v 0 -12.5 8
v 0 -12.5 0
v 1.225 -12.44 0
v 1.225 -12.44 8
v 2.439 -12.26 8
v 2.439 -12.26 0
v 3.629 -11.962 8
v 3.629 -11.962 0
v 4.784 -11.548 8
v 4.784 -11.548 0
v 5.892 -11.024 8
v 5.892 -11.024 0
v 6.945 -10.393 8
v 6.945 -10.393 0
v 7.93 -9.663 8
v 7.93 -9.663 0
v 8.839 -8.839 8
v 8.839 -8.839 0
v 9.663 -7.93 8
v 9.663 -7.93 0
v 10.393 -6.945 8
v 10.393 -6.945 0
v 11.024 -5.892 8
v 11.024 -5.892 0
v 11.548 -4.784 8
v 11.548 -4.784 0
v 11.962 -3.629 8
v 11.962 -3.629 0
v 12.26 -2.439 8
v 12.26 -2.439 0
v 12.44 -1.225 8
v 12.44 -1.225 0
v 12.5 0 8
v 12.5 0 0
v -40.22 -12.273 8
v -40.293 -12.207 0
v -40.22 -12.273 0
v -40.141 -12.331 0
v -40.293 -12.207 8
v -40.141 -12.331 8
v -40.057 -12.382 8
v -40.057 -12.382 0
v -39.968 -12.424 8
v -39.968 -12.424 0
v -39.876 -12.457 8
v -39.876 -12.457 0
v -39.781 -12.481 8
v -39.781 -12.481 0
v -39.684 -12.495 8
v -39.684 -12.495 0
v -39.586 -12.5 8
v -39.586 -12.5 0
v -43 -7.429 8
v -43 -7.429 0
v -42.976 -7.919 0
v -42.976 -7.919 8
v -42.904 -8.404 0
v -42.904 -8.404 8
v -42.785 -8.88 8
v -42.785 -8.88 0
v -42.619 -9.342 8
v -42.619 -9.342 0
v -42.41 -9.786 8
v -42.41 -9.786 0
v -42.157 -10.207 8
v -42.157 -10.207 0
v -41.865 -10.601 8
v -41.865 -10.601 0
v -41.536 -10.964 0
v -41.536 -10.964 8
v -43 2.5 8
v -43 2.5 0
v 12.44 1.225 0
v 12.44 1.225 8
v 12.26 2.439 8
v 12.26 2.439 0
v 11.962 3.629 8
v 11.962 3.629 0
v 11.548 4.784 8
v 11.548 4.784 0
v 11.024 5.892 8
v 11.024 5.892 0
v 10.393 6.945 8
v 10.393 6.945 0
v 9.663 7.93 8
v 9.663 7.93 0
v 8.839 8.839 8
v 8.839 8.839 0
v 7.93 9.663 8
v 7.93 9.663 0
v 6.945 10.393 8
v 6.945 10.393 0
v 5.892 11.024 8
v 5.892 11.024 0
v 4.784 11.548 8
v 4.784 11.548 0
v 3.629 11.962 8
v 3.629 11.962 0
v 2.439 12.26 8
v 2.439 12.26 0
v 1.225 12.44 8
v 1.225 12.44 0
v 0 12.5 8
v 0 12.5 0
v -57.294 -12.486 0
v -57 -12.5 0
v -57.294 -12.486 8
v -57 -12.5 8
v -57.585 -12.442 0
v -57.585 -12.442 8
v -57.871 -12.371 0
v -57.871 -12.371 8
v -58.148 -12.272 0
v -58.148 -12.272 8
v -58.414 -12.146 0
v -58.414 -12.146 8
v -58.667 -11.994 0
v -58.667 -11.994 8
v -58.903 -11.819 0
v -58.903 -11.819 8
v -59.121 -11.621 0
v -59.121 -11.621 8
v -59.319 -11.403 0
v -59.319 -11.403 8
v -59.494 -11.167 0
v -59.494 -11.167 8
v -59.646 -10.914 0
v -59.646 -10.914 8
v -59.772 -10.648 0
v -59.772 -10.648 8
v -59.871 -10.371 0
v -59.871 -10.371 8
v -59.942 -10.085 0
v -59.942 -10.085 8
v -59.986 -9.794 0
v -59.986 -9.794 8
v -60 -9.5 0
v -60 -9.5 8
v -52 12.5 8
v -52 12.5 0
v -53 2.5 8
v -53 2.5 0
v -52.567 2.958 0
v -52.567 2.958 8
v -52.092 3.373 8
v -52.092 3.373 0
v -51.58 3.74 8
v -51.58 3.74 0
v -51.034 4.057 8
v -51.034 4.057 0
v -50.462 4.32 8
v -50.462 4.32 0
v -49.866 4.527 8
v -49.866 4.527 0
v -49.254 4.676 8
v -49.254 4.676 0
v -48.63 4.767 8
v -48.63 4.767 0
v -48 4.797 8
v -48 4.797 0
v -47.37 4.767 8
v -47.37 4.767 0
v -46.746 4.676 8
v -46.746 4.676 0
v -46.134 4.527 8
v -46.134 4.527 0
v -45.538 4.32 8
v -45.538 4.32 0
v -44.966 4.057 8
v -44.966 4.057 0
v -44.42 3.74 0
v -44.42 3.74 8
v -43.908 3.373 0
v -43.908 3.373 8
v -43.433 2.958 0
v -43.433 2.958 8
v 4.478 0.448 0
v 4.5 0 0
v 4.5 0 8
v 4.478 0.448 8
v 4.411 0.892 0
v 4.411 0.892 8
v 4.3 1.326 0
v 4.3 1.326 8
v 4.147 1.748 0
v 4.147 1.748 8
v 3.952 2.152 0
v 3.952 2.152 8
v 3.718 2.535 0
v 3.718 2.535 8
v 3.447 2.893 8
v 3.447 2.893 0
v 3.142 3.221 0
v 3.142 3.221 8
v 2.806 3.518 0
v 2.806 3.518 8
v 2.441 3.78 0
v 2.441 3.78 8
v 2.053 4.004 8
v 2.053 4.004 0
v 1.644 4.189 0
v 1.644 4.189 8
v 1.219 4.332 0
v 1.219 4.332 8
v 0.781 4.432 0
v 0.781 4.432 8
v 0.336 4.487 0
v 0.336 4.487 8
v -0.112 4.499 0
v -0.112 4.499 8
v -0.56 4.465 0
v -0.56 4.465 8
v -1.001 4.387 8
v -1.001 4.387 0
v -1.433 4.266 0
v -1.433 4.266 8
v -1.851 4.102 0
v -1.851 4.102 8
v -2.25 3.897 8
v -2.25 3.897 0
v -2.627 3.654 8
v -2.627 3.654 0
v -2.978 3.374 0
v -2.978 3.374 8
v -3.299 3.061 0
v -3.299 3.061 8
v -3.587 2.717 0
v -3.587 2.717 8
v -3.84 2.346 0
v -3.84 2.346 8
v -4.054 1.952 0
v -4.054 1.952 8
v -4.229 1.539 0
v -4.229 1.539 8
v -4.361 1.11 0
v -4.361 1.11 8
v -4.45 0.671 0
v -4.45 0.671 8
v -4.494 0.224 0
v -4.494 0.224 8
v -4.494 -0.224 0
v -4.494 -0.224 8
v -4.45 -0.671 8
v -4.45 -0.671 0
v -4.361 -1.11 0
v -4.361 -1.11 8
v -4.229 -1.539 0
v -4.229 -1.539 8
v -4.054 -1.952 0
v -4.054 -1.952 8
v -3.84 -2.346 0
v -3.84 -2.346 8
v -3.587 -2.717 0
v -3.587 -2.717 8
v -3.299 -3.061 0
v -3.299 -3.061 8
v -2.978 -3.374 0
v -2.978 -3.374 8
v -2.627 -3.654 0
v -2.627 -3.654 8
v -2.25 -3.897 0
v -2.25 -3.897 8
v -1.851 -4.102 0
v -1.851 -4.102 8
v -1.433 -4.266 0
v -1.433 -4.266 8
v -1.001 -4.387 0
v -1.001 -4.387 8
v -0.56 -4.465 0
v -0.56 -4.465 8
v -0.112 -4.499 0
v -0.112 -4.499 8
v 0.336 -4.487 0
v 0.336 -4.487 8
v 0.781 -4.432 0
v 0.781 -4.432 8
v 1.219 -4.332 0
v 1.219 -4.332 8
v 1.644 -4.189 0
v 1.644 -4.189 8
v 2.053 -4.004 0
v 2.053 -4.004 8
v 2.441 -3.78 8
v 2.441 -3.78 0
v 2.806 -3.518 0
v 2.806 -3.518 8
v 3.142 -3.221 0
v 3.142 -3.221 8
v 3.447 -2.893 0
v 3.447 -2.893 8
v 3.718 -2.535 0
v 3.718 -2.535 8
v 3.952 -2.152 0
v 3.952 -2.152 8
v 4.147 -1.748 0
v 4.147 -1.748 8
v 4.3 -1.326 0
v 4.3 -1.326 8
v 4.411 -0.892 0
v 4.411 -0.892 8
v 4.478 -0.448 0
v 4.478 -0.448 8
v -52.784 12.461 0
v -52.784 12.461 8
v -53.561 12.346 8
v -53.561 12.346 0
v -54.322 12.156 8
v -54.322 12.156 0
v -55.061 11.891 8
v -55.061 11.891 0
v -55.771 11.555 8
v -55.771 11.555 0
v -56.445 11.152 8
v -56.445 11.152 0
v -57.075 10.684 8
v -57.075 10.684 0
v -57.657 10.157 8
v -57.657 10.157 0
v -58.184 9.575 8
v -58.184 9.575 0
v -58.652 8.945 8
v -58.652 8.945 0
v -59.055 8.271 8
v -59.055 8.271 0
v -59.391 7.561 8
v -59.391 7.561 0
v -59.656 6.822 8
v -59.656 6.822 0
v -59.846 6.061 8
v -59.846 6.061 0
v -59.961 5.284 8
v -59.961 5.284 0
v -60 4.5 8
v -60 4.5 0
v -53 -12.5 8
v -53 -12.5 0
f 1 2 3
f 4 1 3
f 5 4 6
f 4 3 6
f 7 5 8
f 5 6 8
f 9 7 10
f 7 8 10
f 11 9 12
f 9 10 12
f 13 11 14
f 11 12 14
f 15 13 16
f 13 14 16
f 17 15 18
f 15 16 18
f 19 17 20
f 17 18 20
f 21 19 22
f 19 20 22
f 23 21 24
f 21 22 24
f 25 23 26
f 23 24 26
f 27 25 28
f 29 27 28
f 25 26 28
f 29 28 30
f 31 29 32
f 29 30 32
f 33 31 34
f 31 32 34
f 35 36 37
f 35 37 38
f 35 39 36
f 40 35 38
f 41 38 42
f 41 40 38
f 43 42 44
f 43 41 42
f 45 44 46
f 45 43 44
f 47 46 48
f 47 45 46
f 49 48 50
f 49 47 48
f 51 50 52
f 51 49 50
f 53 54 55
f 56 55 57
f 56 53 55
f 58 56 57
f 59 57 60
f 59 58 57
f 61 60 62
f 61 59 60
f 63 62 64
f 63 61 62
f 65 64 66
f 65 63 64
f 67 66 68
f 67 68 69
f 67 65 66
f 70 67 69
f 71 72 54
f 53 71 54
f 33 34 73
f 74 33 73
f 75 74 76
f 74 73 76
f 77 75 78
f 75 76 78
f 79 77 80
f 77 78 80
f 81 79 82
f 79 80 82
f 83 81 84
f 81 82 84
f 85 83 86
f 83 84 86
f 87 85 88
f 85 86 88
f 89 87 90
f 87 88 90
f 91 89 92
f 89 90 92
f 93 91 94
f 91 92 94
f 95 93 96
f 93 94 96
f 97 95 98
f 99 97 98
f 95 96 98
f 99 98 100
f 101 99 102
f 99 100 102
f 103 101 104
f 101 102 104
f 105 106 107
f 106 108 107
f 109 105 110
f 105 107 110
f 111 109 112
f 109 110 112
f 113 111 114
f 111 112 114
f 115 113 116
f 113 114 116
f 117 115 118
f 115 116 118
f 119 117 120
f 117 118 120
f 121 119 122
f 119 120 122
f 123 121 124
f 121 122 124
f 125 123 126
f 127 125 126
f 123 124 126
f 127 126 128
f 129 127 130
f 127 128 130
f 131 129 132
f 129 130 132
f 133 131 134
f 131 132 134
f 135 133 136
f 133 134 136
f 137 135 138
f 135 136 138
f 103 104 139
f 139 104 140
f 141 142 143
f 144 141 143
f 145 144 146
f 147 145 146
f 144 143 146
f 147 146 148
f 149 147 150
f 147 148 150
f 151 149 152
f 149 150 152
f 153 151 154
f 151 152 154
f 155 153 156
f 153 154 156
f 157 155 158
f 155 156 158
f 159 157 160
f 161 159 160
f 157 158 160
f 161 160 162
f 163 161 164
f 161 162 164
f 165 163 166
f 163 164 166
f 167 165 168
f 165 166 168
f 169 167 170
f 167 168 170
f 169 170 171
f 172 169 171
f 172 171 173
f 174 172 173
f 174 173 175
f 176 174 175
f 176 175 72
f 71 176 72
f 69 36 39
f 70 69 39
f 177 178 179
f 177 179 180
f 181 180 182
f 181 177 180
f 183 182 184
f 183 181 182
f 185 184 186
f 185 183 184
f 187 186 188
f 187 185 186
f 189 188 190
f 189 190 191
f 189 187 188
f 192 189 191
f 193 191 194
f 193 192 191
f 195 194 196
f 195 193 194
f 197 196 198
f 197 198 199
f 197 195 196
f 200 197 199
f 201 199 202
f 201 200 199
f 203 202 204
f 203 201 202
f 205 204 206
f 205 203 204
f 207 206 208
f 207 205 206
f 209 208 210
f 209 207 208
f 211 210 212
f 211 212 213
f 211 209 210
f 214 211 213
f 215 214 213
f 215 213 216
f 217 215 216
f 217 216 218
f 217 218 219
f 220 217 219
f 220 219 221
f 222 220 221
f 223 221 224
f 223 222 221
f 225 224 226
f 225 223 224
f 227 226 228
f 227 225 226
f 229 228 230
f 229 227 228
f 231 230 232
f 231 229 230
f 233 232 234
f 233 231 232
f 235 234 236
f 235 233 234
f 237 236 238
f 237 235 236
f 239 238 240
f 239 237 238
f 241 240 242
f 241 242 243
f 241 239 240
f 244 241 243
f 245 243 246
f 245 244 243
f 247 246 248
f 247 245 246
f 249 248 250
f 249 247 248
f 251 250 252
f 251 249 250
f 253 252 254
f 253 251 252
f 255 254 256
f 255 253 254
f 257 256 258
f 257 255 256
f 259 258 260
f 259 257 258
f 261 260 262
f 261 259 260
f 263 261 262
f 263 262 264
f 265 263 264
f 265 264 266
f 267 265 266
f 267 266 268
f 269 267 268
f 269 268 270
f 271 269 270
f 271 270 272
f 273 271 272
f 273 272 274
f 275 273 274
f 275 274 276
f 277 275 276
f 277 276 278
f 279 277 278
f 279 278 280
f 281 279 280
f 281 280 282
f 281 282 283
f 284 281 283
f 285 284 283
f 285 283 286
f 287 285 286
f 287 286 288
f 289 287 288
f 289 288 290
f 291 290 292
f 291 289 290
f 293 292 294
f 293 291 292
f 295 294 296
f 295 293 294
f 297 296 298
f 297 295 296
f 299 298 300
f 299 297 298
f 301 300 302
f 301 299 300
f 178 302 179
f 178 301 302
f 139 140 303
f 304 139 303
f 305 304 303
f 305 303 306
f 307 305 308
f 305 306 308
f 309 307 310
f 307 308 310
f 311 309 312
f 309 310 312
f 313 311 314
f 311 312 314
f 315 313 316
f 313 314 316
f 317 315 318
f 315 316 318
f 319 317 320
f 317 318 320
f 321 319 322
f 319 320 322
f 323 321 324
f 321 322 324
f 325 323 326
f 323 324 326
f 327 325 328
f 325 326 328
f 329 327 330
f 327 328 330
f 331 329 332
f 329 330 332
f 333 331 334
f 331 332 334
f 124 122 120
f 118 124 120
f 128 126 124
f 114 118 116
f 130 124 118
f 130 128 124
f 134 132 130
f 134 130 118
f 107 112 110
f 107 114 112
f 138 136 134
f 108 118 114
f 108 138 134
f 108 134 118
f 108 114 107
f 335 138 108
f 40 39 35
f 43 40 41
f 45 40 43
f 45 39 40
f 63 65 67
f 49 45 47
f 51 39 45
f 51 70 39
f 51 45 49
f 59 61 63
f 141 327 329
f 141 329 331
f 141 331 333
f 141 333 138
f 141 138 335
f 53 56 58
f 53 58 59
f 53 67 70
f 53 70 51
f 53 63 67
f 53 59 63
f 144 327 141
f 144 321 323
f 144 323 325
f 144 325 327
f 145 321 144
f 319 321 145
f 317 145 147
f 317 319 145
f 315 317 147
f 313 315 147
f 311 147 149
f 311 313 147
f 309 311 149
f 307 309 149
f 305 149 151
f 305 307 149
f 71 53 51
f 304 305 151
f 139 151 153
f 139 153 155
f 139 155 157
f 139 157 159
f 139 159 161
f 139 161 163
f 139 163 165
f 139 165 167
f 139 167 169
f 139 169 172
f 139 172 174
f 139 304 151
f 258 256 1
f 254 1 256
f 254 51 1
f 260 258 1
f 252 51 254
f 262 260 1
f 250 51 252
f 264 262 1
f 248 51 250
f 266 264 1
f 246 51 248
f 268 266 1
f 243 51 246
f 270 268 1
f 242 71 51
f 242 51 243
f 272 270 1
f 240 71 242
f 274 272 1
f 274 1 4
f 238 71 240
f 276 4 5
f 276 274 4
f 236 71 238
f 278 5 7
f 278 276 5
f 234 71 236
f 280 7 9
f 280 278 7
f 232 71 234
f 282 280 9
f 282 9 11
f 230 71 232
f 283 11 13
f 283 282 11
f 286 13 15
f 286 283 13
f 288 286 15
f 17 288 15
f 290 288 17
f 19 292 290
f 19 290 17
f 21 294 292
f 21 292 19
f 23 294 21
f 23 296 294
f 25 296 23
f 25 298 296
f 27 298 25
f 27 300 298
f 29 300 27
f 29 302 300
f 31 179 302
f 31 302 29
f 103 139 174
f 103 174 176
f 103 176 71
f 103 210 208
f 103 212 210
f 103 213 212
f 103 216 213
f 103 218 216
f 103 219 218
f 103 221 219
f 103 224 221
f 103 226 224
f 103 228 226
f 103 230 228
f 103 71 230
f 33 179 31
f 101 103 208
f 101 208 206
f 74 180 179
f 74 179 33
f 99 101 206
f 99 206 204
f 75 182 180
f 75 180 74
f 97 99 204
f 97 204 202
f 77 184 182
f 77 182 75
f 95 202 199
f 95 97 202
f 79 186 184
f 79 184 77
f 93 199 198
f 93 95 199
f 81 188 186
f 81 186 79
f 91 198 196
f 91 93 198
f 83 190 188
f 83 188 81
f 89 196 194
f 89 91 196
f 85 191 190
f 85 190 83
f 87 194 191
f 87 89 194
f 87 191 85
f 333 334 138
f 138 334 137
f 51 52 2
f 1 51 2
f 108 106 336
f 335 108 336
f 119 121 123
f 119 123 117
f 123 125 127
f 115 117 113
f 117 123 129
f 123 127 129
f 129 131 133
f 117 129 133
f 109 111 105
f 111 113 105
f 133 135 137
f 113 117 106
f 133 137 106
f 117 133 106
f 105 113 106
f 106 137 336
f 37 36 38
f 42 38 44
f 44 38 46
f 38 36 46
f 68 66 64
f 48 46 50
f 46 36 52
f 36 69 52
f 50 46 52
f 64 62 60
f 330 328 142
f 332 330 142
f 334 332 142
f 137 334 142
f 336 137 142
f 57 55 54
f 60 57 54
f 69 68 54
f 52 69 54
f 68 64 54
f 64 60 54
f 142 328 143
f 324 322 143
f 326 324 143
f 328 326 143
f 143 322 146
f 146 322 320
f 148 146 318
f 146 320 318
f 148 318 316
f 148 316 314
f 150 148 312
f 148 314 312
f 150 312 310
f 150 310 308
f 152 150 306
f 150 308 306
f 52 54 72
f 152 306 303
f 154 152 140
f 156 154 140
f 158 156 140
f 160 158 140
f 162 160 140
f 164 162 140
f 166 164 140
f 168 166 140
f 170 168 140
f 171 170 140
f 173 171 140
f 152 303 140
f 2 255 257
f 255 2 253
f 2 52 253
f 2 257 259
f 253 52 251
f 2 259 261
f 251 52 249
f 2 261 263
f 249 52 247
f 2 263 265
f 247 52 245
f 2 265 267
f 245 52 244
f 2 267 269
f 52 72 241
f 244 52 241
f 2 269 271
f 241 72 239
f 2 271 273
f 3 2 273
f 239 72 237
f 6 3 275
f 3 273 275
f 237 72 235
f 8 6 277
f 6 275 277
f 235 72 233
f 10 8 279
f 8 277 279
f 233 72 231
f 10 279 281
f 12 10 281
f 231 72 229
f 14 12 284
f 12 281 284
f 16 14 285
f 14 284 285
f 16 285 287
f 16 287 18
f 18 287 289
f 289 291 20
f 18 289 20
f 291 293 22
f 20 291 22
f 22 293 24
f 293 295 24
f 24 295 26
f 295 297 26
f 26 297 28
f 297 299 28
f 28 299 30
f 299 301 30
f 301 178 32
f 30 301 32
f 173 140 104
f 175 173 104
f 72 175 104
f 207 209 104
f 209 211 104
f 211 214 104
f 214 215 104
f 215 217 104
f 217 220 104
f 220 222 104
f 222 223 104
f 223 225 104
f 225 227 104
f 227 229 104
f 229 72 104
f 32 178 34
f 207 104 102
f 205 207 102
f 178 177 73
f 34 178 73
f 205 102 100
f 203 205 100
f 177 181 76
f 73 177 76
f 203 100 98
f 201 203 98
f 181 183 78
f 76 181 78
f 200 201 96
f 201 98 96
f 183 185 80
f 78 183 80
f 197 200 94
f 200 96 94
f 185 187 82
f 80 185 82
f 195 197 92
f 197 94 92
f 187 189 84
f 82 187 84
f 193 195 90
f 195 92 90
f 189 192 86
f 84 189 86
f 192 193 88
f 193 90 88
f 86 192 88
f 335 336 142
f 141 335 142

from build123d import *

# Parameters (mm, degrees)
F0_R     = 4.5
F1_DEPTH = 8
F2_SIZE  = 3
F3_R     = 5
F4_R     = 1
F5_R     = 3


with BuildPart() as f1:
    # F0 (on Top) → F1 (new body)
    with BuildSketch(Plane.XY):
        with BuildLine():
            ThreePointArc((0, -12.5), (8.8388347648, -8.8388347648), (12.5, 0))
            ThreePointArc((12.5, 0), (8.8388347648, 8.8388347648), (0, 12.5))
            ThreePointArc((0, 12.5), (-12.5, 0), (0, -12.5))
        make_face()
        Circle(F0_R, mode=Mode.SUBTRACT)
        with BuildLine():
            ThreePointArc((0, -12.5), (-12.5, 0), (0, 12.5))
            Line((0, 12.5), (-52, 12.5))
            ThreePointArc((-52, 12.5), (-57.6568542495, 10.1568542495), (-60, 4.5))
            Line((-60, 4.5), (-60, -12.5))
            Line((-60, -12.5), (-53, -12.5))
            Line((-53, -12.5), (-53, 2.5))
            ThreePointArc((-53, 2.5), (-48, 4.7966687366), (-43, 2.5))
            Line((-43, 2.5), (-43, -12.5))
            Line((-43, -12.5), (0, -12.5))
        make_face()
    extrude(amount=F1_DEPTH)

    # F2
    f2_edges = [f1.edges().sort_by_distance(p)[0] for p in [
        (-43, -12.5, 4),
    ]]
    chamfer(f2_edges, length=F2_SIZE)

    # F3
    f3_edges = [f1.edges().sort_by_distance(p)[0] for p in [
        (-43, -9.5, 4),
    ]]
    fillet(f3_edges, radius=F3_R)

    # F4
    f4_edges = [f1.edges().sort_by_distance(p)[0] for p in [
        (-40, -12.5, 4),
    ]]
    fillet(f4_edges, radius=F4_R)

    # F5
    f5_edges = [f1.edges().sort_by_distance(p)[0] for p in [
        (-60, -12.5, 4),
    ]]
    fillet(f5_edges, radius=F5_R)


solid = f1.part
